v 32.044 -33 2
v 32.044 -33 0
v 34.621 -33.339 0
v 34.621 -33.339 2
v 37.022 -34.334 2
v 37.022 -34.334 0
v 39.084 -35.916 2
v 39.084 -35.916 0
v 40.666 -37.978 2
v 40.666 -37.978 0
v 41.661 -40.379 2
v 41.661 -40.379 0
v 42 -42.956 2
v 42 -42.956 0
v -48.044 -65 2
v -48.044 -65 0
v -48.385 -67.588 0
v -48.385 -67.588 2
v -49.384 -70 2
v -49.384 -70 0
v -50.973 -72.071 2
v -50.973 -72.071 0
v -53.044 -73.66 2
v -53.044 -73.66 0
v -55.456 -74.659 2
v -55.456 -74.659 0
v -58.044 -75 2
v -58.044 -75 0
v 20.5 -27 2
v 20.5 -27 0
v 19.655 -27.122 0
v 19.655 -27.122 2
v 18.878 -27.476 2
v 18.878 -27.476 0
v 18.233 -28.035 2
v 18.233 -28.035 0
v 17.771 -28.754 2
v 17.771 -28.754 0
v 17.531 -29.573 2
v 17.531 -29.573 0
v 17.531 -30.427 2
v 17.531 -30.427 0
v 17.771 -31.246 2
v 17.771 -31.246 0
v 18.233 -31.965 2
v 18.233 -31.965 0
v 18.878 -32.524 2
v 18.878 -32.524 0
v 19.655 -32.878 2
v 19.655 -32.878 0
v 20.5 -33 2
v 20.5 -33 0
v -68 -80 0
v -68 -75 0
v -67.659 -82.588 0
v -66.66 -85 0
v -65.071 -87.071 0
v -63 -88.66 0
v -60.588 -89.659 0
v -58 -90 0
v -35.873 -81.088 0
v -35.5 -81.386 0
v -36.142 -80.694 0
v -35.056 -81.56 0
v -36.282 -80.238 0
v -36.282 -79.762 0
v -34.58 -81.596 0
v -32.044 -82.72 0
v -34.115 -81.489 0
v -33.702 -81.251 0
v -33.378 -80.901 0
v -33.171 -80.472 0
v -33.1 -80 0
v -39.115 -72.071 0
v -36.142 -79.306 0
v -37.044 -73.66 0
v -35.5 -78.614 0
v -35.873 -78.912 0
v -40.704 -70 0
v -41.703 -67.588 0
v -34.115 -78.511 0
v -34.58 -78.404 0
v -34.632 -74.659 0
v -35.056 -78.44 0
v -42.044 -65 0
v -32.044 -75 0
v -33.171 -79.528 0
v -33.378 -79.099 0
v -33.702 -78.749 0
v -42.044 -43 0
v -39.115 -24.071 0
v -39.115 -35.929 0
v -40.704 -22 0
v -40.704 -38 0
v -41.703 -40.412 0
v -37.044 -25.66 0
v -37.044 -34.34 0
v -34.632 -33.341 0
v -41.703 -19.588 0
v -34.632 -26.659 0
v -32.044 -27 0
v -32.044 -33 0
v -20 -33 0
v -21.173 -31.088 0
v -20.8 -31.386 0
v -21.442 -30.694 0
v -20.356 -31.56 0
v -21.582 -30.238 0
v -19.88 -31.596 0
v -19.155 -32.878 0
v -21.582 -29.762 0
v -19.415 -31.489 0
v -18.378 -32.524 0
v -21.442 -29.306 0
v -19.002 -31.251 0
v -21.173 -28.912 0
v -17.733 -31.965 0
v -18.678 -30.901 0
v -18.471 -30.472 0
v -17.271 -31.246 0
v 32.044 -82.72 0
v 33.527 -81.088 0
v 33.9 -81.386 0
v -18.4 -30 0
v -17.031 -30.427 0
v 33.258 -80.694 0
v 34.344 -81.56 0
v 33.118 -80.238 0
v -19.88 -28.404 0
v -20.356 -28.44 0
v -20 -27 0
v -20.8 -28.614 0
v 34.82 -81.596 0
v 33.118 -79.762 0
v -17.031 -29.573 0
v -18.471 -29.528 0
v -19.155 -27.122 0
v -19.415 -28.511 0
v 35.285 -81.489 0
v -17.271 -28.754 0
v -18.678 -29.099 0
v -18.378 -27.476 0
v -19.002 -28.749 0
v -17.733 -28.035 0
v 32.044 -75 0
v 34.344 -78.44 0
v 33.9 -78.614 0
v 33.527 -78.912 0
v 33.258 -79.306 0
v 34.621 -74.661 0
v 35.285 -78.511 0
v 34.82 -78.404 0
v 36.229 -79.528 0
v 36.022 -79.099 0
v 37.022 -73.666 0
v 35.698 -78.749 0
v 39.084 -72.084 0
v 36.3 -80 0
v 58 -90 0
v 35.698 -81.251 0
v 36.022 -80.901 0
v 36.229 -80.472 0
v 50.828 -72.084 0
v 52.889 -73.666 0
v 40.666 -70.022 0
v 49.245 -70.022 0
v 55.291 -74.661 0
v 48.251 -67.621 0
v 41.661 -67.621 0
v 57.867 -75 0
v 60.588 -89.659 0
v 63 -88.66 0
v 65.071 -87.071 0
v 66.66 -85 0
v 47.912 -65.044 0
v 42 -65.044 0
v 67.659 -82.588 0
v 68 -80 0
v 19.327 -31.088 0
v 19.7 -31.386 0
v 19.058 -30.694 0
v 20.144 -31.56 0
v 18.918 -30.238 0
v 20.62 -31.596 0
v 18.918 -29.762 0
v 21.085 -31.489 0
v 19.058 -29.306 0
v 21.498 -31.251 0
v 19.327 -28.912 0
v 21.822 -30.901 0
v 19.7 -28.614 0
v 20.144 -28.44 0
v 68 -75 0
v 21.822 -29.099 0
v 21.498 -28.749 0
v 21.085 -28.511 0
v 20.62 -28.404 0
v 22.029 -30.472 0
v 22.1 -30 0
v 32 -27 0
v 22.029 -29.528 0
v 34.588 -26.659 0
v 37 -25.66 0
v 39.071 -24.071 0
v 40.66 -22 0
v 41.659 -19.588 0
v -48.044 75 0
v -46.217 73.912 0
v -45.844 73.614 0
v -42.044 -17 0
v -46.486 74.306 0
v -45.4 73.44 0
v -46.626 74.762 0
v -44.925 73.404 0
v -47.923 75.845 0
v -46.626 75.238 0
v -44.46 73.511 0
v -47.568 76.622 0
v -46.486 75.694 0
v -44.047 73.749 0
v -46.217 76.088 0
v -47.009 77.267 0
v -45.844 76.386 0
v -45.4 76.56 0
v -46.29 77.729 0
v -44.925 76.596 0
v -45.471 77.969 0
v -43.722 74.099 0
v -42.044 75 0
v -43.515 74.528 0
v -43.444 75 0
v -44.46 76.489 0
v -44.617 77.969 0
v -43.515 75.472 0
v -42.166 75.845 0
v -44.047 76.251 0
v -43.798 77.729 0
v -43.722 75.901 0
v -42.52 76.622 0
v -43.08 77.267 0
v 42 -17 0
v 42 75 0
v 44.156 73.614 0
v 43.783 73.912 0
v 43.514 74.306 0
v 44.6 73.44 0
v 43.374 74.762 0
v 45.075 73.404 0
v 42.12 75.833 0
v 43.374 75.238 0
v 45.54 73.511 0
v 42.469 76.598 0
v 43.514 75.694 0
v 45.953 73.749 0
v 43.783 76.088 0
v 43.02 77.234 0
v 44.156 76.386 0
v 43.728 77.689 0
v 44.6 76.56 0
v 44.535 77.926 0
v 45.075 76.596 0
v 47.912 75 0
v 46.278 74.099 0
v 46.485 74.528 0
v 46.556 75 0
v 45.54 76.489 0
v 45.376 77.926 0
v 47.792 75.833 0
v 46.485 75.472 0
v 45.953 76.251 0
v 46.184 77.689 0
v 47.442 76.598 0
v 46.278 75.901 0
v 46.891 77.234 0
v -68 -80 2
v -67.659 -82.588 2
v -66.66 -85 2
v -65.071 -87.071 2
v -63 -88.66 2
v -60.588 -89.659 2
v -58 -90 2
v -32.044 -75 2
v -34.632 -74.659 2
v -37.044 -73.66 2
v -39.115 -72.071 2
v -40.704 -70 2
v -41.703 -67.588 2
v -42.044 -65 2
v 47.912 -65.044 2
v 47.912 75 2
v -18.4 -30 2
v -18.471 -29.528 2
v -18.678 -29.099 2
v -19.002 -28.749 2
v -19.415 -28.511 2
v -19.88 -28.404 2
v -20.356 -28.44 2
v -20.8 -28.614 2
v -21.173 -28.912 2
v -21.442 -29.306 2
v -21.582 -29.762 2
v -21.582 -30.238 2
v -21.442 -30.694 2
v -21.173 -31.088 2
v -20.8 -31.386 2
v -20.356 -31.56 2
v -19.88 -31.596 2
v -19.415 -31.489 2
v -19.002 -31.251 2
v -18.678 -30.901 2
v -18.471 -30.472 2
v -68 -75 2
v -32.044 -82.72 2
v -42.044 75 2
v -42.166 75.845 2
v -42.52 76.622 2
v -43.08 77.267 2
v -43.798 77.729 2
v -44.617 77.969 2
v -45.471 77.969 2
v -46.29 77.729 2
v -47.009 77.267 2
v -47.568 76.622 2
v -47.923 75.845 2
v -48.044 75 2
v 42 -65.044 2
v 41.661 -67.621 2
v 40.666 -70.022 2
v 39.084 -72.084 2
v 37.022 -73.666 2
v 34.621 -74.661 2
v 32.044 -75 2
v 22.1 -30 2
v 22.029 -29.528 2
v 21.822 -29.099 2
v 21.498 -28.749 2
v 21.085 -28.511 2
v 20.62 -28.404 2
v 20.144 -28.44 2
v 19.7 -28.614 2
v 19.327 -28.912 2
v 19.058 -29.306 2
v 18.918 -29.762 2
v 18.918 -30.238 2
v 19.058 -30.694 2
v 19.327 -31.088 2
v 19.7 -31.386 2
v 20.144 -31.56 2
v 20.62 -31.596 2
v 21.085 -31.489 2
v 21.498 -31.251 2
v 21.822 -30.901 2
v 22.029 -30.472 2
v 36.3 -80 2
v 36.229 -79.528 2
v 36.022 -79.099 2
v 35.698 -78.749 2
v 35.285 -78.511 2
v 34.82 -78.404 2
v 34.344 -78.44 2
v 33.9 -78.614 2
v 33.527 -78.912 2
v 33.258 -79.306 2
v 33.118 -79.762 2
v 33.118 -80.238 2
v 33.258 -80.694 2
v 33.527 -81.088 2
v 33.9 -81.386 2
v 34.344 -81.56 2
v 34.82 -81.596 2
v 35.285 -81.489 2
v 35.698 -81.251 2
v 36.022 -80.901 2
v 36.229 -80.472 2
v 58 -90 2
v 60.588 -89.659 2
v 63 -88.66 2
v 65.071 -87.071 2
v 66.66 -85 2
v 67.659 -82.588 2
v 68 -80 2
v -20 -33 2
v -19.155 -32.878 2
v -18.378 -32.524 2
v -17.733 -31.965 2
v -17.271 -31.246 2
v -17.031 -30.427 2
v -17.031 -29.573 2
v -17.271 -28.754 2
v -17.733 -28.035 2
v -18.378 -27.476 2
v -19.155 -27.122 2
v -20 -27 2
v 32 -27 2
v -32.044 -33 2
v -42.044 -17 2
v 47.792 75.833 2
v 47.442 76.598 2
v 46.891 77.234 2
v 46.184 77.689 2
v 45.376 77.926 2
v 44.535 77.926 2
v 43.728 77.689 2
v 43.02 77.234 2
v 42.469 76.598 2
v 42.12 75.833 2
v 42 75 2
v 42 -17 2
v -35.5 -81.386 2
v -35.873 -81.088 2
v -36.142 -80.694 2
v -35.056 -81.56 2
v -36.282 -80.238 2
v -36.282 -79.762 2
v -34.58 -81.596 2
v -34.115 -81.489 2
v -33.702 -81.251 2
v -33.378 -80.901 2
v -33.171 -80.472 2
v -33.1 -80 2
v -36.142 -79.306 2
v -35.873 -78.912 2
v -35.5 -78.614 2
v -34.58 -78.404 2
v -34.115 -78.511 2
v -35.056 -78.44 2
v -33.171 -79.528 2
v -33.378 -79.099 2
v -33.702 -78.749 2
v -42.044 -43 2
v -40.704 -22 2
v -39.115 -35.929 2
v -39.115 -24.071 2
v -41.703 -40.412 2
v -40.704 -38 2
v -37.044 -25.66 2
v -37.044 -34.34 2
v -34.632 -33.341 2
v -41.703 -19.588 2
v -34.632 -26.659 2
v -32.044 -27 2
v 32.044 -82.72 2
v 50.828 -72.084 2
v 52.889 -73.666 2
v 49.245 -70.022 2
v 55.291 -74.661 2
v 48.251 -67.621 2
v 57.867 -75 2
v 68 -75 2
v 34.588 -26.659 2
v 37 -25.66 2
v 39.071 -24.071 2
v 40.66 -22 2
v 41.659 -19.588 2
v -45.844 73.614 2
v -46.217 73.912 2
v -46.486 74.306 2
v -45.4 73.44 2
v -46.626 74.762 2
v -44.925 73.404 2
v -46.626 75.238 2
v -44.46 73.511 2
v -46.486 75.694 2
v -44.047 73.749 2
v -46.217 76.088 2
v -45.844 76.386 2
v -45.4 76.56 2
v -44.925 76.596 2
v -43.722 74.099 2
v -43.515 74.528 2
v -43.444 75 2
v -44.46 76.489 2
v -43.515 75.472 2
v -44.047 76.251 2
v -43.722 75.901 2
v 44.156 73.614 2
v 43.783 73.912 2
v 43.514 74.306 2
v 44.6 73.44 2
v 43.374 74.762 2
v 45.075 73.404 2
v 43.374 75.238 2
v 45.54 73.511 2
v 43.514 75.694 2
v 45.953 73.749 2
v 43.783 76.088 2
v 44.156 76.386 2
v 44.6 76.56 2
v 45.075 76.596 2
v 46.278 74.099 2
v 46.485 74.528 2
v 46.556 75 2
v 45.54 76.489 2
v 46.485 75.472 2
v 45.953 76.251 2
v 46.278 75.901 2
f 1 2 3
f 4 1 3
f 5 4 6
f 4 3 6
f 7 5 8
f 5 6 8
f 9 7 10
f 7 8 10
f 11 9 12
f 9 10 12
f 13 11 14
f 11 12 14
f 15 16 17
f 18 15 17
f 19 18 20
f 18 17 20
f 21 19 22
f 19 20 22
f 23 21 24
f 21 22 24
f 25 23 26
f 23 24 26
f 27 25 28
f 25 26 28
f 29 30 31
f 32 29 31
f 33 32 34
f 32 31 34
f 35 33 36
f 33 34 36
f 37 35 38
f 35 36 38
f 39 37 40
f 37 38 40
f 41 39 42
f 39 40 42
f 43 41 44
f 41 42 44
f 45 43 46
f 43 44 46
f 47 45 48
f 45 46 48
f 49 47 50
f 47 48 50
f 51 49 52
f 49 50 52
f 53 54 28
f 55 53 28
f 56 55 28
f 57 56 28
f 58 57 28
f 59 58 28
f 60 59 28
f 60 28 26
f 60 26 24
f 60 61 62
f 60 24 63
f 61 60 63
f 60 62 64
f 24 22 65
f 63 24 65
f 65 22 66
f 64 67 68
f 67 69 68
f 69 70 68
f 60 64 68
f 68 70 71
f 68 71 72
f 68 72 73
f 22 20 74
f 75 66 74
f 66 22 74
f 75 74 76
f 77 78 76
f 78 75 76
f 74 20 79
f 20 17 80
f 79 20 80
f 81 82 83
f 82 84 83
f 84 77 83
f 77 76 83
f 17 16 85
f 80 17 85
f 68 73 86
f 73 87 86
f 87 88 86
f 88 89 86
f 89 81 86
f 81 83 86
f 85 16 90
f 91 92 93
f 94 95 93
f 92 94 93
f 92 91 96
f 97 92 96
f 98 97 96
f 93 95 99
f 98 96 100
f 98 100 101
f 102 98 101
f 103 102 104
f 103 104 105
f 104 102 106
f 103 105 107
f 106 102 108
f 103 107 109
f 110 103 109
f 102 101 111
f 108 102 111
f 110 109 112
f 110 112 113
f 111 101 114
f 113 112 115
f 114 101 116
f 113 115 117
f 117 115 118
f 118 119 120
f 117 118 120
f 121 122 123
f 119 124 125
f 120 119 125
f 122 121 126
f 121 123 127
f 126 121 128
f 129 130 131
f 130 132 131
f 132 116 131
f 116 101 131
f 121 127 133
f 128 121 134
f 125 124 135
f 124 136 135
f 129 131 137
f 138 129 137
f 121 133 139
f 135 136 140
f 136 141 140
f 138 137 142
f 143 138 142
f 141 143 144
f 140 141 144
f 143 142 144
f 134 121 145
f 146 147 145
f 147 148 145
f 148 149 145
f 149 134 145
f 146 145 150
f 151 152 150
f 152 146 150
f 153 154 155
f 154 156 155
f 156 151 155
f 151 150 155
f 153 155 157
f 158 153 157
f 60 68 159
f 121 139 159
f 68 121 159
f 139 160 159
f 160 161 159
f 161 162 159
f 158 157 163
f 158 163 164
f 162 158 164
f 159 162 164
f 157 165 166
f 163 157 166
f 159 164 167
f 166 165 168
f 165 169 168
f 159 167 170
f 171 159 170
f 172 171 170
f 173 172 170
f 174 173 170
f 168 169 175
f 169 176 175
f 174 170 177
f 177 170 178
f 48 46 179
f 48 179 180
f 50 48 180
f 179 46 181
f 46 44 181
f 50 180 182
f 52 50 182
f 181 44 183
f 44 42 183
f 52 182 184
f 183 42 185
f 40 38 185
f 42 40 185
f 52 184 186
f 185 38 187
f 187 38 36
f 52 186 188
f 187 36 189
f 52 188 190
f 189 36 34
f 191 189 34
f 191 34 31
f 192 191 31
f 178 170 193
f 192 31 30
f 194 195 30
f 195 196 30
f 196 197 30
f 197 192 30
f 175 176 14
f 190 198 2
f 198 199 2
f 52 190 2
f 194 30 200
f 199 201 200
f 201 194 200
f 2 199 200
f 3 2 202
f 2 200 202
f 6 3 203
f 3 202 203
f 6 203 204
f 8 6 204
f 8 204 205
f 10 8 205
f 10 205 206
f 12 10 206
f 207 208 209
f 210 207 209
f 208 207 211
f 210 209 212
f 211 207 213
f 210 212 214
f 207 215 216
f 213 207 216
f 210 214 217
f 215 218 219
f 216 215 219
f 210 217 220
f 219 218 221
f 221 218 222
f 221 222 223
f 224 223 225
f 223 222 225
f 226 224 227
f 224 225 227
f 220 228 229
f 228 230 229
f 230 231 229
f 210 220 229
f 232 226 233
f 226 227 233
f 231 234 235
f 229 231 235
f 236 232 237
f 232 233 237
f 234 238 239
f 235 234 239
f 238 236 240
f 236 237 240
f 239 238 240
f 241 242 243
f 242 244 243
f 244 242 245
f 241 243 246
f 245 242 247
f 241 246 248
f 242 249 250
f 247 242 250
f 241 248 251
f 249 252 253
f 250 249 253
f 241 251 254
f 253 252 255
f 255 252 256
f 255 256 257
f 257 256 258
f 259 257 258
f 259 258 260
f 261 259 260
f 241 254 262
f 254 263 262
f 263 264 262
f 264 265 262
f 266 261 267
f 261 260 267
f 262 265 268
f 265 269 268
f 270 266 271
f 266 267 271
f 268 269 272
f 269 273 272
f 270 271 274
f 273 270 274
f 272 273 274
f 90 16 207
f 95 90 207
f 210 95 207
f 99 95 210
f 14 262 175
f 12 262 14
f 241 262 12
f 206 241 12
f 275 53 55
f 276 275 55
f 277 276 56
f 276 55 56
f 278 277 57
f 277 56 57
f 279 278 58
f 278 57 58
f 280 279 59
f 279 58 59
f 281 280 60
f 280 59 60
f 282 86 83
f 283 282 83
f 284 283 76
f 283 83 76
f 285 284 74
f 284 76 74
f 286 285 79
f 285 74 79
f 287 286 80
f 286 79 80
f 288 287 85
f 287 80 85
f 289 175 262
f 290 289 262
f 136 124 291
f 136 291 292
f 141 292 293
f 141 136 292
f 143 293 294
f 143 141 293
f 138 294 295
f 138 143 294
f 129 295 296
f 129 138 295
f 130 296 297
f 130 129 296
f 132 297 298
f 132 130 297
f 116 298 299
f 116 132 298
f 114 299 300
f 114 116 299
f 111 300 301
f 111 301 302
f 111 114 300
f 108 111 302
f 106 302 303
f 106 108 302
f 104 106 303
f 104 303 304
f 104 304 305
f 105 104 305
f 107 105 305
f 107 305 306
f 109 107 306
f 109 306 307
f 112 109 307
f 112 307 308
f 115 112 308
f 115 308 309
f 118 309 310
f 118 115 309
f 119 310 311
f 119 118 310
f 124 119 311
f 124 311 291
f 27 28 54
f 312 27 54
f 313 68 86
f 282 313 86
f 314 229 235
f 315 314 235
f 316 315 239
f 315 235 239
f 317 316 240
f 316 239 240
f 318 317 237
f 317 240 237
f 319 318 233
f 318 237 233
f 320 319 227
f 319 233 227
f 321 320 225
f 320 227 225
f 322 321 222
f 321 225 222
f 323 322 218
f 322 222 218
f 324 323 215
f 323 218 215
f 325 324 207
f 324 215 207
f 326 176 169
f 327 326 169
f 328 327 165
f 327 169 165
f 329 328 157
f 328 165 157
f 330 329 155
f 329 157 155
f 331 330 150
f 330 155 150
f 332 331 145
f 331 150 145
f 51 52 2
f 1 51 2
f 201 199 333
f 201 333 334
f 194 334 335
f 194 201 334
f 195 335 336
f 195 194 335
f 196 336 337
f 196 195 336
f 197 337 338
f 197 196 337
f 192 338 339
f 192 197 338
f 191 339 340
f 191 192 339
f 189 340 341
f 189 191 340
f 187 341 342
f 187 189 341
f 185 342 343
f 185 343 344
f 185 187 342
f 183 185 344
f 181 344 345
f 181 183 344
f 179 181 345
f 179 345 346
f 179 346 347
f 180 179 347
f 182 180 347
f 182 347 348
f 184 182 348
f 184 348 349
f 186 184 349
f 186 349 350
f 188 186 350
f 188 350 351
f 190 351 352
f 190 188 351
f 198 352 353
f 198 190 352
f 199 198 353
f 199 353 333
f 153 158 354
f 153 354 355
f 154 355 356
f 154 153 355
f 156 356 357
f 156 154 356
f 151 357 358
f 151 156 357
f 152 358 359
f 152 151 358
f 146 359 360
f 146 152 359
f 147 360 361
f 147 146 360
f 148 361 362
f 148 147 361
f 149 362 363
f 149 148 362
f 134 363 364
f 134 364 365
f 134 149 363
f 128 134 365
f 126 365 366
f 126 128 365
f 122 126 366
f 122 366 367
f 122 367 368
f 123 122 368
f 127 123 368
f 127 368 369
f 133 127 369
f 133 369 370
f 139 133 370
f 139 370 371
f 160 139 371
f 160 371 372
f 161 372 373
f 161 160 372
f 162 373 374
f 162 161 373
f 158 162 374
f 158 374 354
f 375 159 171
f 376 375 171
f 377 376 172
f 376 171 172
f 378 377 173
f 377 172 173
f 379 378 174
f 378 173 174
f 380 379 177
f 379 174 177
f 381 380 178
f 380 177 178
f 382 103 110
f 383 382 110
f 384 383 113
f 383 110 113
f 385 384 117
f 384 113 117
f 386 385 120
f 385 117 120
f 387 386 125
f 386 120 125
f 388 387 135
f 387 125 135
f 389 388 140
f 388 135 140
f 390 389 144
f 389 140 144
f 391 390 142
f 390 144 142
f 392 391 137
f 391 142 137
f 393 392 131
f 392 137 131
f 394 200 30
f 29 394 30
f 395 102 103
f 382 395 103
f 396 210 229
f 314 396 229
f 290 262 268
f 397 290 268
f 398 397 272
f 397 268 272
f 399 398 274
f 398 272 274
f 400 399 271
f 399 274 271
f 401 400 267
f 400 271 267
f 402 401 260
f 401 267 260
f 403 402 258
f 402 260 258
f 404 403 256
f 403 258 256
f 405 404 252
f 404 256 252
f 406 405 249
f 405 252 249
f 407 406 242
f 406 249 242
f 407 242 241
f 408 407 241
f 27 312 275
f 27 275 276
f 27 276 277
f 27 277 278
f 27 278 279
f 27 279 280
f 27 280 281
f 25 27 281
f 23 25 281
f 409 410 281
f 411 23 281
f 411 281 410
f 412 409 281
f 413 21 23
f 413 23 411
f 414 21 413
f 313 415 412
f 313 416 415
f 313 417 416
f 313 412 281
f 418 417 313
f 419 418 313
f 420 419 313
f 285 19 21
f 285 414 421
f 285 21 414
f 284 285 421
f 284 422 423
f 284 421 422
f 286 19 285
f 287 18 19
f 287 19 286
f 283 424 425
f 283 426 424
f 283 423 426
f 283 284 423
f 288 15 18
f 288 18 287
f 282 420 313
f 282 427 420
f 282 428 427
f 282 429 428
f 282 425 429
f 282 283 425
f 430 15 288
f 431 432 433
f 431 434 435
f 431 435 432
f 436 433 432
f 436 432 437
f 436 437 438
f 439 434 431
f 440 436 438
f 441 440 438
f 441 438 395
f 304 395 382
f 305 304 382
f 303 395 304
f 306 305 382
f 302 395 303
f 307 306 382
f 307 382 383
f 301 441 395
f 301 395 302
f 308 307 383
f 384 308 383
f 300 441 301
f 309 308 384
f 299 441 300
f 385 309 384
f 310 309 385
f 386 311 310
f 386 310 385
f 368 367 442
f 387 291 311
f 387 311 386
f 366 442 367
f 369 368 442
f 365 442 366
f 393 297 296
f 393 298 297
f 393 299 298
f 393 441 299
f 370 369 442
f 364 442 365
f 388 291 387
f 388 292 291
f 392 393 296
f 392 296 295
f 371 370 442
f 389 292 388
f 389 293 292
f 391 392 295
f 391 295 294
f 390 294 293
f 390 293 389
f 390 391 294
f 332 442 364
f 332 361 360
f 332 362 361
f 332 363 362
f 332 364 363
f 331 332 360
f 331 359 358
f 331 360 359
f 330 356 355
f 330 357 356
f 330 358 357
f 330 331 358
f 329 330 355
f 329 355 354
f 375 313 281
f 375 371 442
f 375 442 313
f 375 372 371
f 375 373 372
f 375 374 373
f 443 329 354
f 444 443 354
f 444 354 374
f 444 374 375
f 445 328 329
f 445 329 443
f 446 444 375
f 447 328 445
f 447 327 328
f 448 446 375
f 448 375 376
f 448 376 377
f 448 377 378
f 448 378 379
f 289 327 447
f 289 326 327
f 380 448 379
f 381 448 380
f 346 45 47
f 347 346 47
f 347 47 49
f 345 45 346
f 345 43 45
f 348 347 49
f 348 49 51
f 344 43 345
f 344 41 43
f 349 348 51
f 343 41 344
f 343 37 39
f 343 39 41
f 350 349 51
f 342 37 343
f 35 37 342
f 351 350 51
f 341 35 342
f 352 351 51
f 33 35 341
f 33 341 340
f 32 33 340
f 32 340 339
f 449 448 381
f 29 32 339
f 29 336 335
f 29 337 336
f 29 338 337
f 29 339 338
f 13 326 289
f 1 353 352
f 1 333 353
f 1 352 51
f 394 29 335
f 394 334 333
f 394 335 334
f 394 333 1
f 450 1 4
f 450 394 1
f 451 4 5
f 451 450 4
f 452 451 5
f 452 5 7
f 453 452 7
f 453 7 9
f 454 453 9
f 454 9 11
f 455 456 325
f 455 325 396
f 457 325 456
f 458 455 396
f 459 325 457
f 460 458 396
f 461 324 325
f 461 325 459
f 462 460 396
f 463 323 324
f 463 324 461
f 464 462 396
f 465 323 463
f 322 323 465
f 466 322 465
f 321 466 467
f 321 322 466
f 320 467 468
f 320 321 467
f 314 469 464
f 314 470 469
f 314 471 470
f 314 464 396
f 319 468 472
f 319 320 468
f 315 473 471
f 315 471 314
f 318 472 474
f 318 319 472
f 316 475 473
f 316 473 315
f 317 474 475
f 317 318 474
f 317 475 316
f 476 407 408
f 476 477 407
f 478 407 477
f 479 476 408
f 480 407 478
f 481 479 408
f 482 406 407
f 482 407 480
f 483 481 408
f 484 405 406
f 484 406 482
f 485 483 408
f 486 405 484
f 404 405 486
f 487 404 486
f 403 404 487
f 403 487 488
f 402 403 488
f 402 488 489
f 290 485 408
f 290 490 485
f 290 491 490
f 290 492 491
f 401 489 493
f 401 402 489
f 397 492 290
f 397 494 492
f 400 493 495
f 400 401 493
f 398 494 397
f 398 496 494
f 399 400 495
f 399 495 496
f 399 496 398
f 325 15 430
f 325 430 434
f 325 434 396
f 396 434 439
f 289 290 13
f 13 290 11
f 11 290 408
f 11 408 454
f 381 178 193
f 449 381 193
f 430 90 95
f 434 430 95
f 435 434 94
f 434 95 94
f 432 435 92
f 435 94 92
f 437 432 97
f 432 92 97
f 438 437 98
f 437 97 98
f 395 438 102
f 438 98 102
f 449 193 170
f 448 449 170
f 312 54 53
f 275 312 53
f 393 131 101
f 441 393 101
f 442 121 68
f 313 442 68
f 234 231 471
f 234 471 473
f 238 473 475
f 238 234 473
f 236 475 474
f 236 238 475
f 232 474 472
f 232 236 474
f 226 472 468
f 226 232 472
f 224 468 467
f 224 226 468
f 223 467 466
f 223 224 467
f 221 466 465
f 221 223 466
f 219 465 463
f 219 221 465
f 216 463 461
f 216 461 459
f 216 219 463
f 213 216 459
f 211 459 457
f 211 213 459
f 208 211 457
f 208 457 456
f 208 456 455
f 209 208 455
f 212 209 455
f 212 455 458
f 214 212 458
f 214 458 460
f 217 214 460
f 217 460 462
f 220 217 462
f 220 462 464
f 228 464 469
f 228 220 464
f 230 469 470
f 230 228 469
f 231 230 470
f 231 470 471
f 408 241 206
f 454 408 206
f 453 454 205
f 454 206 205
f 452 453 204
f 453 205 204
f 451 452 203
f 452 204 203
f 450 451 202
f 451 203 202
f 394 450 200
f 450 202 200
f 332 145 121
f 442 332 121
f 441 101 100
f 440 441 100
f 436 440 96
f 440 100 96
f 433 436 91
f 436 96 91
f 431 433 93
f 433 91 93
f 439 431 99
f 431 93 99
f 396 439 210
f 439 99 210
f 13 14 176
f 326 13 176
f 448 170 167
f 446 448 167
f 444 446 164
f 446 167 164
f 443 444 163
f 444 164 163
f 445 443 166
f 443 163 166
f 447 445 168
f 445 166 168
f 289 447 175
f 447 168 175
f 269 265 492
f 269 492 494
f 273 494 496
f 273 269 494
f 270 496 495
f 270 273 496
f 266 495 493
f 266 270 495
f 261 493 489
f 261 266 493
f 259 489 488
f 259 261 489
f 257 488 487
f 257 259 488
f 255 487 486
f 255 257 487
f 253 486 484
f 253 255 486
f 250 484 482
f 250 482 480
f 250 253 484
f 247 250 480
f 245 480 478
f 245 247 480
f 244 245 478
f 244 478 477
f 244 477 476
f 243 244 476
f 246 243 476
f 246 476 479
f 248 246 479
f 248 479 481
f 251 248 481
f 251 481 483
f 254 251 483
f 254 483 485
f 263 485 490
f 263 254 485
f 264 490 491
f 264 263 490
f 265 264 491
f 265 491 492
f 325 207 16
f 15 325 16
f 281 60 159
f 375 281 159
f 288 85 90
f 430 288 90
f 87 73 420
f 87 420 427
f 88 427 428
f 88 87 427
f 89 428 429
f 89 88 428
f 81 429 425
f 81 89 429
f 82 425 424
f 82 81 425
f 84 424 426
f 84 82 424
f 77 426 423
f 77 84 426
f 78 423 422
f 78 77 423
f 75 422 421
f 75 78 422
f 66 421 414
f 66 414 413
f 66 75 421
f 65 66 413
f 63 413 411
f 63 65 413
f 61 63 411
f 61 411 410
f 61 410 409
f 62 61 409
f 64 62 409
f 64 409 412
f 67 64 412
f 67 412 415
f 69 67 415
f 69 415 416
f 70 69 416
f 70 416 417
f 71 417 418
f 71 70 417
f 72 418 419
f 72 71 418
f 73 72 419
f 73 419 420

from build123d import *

# Parameters (mm, degrees)
SKETCH1_R           = 1.6
BOSS_EXTRUDE1_DEPTH = 2


with BuildPart() as part:
    # Sketch1 → Boss-Extrude1 (new body)
    with BuildSketch(Plane.XY):
        with BuildLine():
            Line((-48.044206104, 75), (-48.044206104, -65))
            ThreePointArc((-48.044206104, -65), (-50.973138292, -72.071067812), (-58.044206104, -75))
            Line((-58.044206104, -75), (-68, -75))
            Line((-68, -75), (-68, -80))
            ThreePointArc((-68, -80), (-65.071067812, -87.071067812), (-58, -90))
            Line((-58, -90), (58, -90))
            ThreePointArc((58, -90), (65.071067812, -87.071067812), (68, -80))
            Line((68, -80), (68, -75))
            Line((68, -75), (57.867381689, -75))
            ThreePointArc((57.867381689, -75), (50.827572313, -72.08401548), (47.911587793, -65.044206104))
            Line((47.911587793, -65.044206104), (47.911587793, 75))
            ThreePointArc((47.911587793, 75), (44.955793896, 77.955793896), (42, 75))
            Line((42, 75), (42, -17))
            ThreePointArc((42, -17), (39.071067812, -24.071067812), (32, -27))
            Line((32, -27), (20.5, -27))
            ThreePointArc((20.5, -27), (17.5, -30), (20.5, -33))
            Line((20.5, -33), (32.044206104, -33))
            ThreePointArc((32.044206104, -33), (39.08401548, -35.91598452), (42, -42.955793896))
            Line((42, -42.955793896), (42, -65.044206104))
            ThreePointArc((42, -65.044206104), (39.08401548, -72.08401548), (32.044206104, -75))
            Line((32.044206104, -75), (32.044206104, -82.72))
            Line((32.044206104, -82.72), (-32.044206104, -82.72))
            Line((-32.044206104, -82.72), (-32.044206104, -75))
            ThreePointArc((-32.044206104, -75), (-39.115273915, -72.071067812), (-42.044206104, -65))
            Line((-42.044206104, -65), (-42.044206104, -43))
            ThreePointArc((-42.044206104, -43), (-39.115273915, -35.928932188), (-32.044206104, -33))
            Line((-32.044206104, -33), (-20, -33))
            ThreePointArc((-20, -33), (-17, -30), (-20, -27))
            Line((-20, -27), (-32.044206104, -27))
            ThreePointArc((-32.044206104, -27), (-39.115273915, -24.071067812), (-42.044206104, -17))
            Line((-42.044206104, -17), (-42.044206104, 75))
            ThreePointArc((-42.044206104, 75), (-45.044206104, 78), (-48.044206104, 75))
        make_face()
        with Locations((-45.044206104, 75)):
            Circle(SKETCH1_R, mode=Mode.SUBTRACT)
        with Locations((44.955793896, 75)):
            Circle(SKETCH1_R, mode=Mode.SUBTRACT)
        with Locations((-34.7, -80)):
            Circle(SKETCH1_R, mode=Mode.SUBTRACT)
        with Locations((34.7, -80)):
            Circle(SKETCH1_R, mode=Mode.SUBTRACT)
        with Locations((-20, -30)):
            Circle(SKETCH1_R, mode=Mode.SUBTRACT)
        with Locations((20.5, -30)):
            Circle(SKETCH1_R, mode=Mode.SUBTRACT)
    extrude(amount=BOSS_EXTRUDE1_DEPTH)


solid = part.part
